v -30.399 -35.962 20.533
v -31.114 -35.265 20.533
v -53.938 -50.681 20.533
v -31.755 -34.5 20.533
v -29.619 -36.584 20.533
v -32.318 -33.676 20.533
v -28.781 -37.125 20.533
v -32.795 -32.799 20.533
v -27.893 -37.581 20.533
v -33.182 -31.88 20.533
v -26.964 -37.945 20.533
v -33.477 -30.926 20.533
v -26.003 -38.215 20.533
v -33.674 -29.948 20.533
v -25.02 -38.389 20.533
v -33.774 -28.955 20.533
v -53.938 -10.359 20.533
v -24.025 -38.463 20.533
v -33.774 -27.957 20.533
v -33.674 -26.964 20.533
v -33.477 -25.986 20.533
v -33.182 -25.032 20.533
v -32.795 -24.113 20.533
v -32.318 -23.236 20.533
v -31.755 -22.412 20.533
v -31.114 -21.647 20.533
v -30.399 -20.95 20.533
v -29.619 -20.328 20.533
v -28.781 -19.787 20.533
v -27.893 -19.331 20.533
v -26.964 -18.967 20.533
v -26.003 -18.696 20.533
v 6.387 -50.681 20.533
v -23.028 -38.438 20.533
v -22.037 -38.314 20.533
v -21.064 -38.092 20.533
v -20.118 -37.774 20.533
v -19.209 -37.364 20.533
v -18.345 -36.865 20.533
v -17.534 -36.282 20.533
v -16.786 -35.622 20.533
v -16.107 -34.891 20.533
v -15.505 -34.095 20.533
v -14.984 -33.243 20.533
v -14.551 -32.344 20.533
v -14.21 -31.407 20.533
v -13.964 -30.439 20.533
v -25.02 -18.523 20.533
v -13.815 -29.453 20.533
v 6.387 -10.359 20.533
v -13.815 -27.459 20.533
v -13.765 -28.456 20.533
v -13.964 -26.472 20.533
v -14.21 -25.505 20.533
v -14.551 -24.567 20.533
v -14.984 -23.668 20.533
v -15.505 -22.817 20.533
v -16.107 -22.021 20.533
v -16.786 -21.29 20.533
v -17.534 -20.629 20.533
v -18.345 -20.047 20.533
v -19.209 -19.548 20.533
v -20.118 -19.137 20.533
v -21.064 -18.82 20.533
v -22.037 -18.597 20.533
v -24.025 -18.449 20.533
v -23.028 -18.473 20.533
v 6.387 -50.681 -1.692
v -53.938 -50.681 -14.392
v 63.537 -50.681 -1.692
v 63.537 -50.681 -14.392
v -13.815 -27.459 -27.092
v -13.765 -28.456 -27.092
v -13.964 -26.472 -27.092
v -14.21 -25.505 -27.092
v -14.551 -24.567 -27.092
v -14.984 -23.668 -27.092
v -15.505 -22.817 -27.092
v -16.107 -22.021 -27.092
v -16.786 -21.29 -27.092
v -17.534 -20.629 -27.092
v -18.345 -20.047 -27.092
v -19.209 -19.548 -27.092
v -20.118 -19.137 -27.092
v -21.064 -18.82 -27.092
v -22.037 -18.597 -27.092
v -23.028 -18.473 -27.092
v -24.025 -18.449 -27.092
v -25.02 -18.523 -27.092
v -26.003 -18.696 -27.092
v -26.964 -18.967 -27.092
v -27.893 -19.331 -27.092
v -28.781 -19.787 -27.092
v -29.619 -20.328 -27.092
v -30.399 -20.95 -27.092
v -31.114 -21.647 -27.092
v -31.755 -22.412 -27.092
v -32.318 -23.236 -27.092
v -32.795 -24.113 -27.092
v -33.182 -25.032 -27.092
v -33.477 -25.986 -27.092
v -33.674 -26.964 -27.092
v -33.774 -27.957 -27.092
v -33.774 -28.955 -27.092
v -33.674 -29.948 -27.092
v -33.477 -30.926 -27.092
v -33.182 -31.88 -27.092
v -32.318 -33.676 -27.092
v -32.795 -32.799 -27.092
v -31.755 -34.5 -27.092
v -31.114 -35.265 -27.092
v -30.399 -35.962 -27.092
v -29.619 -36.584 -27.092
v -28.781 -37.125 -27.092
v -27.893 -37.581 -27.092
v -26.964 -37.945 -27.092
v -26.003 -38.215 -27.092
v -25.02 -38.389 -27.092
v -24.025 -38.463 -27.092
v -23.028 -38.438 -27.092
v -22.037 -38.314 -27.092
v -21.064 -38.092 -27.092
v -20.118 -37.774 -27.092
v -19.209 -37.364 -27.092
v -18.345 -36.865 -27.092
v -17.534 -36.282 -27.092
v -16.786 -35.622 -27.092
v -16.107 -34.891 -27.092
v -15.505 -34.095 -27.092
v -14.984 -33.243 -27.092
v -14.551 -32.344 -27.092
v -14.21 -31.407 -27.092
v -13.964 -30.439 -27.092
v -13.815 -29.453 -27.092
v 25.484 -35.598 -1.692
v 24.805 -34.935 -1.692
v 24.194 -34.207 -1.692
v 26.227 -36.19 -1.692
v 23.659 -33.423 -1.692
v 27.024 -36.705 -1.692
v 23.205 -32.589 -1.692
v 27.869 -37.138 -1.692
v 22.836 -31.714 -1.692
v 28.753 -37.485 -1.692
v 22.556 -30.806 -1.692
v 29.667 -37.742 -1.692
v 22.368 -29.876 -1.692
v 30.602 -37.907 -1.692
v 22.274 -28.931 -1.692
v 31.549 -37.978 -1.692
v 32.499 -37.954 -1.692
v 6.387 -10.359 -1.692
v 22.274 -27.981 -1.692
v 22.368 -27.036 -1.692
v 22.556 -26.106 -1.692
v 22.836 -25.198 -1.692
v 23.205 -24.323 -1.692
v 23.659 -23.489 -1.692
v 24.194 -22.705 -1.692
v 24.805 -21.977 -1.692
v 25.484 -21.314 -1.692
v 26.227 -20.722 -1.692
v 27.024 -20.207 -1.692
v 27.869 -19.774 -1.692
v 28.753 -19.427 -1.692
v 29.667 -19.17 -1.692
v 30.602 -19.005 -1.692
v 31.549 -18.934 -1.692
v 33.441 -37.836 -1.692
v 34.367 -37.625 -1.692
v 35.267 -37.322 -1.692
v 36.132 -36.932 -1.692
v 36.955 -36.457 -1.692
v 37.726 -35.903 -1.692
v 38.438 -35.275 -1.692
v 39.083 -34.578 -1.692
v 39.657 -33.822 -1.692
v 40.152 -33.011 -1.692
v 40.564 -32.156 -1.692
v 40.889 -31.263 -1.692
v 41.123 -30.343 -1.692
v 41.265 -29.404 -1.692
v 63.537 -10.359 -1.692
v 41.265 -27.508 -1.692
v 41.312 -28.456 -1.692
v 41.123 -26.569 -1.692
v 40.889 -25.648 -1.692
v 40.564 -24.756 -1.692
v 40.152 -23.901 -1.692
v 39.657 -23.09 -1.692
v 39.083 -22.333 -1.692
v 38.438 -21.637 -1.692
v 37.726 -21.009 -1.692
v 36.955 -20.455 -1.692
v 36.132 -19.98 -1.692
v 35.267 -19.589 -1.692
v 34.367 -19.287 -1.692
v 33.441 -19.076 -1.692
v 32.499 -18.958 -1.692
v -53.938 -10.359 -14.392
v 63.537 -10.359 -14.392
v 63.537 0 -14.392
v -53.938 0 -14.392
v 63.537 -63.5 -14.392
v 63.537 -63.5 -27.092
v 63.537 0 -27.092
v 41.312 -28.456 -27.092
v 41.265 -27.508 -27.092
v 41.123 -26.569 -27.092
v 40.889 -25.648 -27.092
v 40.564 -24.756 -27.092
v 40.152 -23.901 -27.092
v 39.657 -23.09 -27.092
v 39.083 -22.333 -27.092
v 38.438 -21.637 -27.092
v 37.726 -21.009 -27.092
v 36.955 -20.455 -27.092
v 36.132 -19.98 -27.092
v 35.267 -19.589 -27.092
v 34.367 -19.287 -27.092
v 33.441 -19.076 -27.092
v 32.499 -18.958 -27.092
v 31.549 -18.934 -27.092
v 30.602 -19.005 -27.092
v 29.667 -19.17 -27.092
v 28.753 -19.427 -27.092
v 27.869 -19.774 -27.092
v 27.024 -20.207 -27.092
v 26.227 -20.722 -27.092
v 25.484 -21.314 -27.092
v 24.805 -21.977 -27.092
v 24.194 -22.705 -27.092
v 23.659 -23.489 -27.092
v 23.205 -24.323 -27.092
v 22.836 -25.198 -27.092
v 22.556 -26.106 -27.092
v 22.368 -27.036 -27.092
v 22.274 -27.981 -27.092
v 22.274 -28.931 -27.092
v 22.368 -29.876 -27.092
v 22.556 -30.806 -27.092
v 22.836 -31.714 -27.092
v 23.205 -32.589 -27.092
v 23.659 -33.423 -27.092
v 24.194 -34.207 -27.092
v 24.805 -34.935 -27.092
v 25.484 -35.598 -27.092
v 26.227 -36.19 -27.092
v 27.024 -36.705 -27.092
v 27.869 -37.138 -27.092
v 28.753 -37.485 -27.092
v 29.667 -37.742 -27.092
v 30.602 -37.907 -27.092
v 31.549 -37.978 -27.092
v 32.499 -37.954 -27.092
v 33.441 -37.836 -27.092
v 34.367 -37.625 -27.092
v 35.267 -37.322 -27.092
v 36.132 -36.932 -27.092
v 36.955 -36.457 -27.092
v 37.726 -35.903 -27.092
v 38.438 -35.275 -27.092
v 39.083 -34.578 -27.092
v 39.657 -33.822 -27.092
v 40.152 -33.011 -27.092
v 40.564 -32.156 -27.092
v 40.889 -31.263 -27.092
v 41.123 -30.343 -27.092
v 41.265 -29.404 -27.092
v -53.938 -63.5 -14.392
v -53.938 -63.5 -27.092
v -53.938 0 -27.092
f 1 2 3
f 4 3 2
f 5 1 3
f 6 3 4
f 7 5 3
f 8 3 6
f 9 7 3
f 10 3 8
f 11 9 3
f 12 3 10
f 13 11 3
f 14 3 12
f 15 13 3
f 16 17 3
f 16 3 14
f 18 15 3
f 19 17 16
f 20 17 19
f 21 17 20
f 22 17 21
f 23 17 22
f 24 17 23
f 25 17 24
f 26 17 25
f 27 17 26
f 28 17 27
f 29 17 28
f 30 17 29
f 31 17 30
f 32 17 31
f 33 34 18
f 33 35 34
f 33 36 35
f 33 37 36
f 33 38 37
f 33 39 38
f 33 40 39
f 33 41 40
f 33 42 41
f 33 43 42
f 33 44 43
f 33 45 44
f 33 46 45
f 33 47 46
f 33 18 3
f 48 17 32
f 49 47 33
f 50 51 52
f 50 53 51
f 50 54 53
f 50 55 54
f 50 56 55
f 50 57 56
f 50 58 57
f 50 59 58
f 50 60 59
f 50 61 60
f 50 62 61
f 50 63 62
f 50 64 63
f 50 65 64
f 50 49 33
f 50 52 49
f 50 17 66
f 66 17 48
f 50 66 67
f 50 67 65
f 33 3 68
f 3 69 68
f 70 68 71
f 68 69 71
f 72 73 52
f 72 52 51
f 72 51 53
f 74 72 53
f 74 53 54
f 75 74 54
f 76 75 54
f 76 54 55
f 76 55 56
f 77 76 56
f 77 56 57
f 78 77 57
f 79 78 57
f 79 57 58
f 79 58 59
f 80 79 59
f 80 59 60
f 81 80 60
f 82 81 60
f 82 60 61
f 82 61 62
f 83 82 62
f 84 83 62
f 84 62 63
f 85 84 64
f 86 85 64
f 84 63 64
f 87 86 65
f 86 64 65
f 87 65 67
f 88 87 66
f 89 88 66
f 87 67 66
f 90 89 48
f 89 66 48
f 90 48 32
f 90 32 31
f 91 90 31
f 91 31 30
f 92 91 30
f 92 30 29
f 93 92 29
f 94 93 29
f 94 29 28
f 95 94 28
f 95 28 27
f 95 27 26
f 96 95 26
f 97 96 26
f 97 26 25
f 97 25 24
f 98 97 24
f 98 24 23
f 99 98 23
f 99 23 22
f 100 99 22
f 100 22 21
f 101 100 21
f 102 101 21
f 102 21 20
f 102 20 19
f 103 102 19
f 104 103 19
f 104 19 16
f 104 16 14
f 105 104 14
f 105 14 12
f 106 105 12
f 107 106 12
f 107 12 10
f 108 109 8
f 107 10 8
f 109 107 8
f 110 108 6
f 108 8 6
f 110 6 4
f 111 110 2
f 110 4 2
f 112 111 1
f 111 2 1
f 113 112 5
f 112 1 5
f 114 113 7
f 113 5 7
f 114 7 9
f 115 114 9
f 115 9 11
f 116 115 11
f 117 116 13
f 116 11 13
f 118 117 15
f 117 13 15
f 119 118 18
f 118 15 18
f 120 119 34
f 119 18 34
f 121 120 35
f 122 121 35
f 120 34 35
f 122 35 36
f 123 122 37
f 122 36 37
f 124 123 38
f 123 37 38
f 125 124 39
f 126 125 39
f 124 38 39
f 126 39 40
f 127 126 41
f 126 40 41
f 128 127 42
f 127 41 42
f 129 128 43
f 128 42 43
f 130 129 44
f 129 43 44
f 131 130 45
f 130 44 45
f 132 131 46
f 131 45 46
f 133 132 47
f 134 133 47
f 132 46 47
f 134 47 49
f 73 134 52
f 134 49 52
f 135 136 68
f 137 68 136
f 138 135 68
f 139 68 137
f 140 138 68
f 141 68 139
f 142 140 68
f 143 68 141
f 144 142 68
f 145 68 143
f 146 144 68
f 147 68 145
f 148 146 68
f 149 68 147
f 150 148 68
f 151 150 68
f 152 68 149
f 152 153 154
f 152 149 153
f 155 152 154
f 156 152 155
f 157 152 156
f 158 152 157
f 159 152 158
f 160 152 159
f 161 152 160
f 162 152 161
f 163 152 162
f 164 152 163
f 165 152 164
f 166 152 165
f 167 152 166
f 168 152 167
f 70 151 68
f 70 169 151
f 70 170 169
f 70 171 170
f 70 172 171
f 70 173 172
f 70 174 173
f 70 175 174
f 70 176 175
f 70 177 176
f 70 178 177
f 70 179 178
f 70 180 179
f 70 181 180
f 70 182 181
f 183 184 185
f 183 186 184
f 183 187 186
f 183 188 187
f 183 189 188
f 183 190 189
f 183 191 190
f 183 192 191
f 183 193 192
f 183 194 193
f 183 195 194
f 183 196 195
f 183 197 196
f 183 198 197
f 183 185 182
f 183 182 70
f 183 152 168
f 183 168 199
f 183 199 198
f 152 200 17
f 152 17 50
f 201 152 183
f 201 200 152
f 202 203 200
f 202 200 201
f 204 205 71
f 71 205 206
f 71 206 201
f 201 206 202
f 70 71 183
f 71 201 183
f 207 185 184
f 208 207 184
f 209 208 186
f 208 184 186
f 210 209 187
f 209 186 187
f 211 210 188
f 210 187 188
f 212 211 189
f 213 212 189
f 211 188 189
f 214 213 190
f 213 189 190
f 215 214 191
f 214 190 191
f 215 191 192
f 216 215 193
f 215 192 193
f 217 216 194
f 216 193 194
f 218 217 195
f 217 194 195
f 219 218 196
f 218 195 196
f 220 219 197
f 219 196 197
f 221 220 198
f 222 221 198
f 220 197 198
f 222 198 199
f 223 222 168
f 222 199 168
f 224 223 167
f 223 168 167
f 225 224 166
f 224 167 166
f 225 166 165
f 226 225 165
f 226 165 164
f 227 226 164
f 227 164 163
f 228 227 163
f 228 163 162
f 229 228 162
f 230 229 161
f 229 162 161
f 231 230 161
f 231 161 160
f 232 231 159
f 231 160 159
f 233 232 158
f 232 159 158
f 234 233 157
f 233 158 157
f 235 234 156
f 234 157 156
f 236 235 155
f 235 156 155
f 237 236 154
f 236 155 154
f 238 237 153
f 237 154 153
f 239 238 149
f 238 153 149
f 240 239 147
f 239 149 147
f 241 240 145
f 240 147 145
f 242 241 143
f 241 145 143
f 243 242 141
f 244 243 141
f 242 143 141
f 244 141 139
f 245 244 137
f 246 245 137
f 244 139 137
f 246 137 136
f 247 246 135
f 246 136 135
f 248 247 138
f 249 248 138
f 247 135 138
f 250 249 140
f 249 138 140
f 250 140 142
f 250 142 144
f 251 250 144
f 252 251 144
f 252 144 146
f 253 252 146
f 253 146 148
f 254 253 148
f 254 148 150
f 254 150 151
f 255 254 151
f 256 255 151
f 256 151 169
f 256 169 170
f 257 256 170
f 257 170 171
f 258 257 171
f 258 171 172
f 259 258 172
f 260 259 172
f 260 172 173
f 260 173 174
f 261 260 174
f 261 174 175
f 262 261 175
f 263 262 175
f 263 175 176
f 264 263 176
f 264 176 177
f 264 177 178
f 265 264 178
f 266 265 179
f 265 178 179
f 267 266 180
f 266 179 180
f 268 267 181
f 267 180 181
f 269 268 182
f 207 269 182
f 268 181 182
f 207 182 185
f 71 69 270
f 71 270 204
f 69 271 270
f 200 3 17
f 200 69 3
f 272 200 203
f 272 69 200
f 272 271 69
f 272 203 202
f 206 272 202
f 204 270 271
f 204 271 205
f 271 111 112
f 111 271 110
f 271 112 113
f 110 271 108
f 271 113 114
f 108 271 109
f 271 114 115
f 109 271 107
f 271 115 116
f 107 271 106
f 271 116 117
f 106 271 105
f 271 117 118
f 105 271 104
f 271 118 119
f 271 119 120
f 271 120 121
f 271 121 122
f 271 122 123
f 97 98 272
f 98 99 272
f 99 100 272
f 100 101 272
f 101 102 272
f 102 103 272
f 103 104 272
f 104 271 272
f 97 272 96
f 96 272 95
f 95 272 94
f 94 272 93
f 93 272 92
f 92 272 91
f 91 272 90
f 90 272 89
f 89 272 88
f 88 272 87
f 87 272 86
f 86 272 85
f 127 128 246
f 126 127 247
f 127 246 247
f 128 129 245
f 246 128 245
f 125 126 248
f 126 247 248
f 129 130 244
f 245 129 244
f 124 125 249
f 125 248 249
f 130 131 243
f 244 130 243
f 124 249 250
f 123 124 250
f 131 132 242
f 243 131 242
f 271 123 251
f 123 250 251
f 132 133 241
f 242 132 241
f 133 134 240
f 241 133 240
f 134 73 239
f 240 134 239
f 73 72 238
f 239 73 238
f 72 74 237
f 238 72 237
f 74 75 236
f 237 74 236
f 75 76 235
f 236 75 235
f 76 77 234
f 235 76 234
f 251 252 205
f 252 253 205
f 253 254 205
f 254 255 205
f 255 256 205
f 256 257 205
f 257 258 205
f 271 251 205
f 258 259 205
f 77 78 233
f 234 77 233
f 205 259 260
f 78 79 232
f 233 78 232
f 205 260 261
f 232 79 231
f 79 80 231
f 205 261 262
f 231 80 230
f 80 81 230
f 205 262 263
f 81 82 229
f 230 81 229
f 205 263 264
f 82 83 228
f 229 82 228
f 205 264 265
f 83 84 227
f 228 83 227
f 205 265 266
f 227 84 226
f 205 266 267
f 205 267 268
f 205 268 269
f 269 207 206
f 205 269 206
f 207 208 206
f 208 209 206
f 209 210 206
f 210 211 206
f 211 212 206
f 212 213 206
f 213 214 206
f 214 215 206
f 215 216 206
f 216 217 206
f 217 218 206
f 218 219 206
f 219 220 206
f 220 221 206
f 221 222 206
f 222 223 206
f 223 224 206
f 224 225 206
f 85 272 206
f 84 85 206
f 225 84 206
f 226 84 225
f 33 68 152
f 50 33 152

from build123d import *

# Parameters (mm, degrees)
F0_W     = 117.475
F0_H     = 12.7
F1_DEPTH = 63.5
F2_W     = 117.475
F2_H     = 40.322089
F3_DEPTH = 12.7
F4_W     = 60.325
F4_H     = 40.322089
F5_DEPTH = 22.225
F6_R     = 9.525
F7_DEPTH = 25.4
F8_R     = 10.010488
F9_DEPTH = 47.879


with BuildPart() as f1:
    # F0 (on Front) → F1 (new body)
    with BuildSketch(Plane.XZ):
        with Locations((4.799338, -20.741718)):
            Rectangle(F0_W, F0_H)
    extrude(amount=F1_DEPTH)

    # F2 (on face) → F3 (join)
    with BuildSketch(Plane.XY.offset(-14.391718)):
        with Locations((4.799338, -30.519849)):
            Rectangle(F2_W, F2_H)
    extrude(amount=F3_DEPTH)

    # F4 (on face) → F5 (join)
    with BuildSketch(Plane.XY.offset(-1.691718)):
        with Locations((-23.775662, -30.519849)):
            Rectangle(F4_W, F4_H)
    extrude(amount=F5_DEPTH)

    # F6 (on face) → F7 (cut)
    with BuildSketch(Plane.XY.offset(-1.691718)):
        with Locations((31.786838, -28.455894)):
            Circle(F6_R)
    extrude(amount=-F7_DEPTH, mode=Mode.SUBTRACT)

    # F8 (on face) → F9 (cut)
    with BuildSketch(Plane.XY.offset(20.533282)):
        with Locations((-23.775662, -28.455894)):
            Circle(F8_R)
    extrude(amount=-F9_DEPTH, mode=Mode.SUBTRACT)


solid = f1.part
